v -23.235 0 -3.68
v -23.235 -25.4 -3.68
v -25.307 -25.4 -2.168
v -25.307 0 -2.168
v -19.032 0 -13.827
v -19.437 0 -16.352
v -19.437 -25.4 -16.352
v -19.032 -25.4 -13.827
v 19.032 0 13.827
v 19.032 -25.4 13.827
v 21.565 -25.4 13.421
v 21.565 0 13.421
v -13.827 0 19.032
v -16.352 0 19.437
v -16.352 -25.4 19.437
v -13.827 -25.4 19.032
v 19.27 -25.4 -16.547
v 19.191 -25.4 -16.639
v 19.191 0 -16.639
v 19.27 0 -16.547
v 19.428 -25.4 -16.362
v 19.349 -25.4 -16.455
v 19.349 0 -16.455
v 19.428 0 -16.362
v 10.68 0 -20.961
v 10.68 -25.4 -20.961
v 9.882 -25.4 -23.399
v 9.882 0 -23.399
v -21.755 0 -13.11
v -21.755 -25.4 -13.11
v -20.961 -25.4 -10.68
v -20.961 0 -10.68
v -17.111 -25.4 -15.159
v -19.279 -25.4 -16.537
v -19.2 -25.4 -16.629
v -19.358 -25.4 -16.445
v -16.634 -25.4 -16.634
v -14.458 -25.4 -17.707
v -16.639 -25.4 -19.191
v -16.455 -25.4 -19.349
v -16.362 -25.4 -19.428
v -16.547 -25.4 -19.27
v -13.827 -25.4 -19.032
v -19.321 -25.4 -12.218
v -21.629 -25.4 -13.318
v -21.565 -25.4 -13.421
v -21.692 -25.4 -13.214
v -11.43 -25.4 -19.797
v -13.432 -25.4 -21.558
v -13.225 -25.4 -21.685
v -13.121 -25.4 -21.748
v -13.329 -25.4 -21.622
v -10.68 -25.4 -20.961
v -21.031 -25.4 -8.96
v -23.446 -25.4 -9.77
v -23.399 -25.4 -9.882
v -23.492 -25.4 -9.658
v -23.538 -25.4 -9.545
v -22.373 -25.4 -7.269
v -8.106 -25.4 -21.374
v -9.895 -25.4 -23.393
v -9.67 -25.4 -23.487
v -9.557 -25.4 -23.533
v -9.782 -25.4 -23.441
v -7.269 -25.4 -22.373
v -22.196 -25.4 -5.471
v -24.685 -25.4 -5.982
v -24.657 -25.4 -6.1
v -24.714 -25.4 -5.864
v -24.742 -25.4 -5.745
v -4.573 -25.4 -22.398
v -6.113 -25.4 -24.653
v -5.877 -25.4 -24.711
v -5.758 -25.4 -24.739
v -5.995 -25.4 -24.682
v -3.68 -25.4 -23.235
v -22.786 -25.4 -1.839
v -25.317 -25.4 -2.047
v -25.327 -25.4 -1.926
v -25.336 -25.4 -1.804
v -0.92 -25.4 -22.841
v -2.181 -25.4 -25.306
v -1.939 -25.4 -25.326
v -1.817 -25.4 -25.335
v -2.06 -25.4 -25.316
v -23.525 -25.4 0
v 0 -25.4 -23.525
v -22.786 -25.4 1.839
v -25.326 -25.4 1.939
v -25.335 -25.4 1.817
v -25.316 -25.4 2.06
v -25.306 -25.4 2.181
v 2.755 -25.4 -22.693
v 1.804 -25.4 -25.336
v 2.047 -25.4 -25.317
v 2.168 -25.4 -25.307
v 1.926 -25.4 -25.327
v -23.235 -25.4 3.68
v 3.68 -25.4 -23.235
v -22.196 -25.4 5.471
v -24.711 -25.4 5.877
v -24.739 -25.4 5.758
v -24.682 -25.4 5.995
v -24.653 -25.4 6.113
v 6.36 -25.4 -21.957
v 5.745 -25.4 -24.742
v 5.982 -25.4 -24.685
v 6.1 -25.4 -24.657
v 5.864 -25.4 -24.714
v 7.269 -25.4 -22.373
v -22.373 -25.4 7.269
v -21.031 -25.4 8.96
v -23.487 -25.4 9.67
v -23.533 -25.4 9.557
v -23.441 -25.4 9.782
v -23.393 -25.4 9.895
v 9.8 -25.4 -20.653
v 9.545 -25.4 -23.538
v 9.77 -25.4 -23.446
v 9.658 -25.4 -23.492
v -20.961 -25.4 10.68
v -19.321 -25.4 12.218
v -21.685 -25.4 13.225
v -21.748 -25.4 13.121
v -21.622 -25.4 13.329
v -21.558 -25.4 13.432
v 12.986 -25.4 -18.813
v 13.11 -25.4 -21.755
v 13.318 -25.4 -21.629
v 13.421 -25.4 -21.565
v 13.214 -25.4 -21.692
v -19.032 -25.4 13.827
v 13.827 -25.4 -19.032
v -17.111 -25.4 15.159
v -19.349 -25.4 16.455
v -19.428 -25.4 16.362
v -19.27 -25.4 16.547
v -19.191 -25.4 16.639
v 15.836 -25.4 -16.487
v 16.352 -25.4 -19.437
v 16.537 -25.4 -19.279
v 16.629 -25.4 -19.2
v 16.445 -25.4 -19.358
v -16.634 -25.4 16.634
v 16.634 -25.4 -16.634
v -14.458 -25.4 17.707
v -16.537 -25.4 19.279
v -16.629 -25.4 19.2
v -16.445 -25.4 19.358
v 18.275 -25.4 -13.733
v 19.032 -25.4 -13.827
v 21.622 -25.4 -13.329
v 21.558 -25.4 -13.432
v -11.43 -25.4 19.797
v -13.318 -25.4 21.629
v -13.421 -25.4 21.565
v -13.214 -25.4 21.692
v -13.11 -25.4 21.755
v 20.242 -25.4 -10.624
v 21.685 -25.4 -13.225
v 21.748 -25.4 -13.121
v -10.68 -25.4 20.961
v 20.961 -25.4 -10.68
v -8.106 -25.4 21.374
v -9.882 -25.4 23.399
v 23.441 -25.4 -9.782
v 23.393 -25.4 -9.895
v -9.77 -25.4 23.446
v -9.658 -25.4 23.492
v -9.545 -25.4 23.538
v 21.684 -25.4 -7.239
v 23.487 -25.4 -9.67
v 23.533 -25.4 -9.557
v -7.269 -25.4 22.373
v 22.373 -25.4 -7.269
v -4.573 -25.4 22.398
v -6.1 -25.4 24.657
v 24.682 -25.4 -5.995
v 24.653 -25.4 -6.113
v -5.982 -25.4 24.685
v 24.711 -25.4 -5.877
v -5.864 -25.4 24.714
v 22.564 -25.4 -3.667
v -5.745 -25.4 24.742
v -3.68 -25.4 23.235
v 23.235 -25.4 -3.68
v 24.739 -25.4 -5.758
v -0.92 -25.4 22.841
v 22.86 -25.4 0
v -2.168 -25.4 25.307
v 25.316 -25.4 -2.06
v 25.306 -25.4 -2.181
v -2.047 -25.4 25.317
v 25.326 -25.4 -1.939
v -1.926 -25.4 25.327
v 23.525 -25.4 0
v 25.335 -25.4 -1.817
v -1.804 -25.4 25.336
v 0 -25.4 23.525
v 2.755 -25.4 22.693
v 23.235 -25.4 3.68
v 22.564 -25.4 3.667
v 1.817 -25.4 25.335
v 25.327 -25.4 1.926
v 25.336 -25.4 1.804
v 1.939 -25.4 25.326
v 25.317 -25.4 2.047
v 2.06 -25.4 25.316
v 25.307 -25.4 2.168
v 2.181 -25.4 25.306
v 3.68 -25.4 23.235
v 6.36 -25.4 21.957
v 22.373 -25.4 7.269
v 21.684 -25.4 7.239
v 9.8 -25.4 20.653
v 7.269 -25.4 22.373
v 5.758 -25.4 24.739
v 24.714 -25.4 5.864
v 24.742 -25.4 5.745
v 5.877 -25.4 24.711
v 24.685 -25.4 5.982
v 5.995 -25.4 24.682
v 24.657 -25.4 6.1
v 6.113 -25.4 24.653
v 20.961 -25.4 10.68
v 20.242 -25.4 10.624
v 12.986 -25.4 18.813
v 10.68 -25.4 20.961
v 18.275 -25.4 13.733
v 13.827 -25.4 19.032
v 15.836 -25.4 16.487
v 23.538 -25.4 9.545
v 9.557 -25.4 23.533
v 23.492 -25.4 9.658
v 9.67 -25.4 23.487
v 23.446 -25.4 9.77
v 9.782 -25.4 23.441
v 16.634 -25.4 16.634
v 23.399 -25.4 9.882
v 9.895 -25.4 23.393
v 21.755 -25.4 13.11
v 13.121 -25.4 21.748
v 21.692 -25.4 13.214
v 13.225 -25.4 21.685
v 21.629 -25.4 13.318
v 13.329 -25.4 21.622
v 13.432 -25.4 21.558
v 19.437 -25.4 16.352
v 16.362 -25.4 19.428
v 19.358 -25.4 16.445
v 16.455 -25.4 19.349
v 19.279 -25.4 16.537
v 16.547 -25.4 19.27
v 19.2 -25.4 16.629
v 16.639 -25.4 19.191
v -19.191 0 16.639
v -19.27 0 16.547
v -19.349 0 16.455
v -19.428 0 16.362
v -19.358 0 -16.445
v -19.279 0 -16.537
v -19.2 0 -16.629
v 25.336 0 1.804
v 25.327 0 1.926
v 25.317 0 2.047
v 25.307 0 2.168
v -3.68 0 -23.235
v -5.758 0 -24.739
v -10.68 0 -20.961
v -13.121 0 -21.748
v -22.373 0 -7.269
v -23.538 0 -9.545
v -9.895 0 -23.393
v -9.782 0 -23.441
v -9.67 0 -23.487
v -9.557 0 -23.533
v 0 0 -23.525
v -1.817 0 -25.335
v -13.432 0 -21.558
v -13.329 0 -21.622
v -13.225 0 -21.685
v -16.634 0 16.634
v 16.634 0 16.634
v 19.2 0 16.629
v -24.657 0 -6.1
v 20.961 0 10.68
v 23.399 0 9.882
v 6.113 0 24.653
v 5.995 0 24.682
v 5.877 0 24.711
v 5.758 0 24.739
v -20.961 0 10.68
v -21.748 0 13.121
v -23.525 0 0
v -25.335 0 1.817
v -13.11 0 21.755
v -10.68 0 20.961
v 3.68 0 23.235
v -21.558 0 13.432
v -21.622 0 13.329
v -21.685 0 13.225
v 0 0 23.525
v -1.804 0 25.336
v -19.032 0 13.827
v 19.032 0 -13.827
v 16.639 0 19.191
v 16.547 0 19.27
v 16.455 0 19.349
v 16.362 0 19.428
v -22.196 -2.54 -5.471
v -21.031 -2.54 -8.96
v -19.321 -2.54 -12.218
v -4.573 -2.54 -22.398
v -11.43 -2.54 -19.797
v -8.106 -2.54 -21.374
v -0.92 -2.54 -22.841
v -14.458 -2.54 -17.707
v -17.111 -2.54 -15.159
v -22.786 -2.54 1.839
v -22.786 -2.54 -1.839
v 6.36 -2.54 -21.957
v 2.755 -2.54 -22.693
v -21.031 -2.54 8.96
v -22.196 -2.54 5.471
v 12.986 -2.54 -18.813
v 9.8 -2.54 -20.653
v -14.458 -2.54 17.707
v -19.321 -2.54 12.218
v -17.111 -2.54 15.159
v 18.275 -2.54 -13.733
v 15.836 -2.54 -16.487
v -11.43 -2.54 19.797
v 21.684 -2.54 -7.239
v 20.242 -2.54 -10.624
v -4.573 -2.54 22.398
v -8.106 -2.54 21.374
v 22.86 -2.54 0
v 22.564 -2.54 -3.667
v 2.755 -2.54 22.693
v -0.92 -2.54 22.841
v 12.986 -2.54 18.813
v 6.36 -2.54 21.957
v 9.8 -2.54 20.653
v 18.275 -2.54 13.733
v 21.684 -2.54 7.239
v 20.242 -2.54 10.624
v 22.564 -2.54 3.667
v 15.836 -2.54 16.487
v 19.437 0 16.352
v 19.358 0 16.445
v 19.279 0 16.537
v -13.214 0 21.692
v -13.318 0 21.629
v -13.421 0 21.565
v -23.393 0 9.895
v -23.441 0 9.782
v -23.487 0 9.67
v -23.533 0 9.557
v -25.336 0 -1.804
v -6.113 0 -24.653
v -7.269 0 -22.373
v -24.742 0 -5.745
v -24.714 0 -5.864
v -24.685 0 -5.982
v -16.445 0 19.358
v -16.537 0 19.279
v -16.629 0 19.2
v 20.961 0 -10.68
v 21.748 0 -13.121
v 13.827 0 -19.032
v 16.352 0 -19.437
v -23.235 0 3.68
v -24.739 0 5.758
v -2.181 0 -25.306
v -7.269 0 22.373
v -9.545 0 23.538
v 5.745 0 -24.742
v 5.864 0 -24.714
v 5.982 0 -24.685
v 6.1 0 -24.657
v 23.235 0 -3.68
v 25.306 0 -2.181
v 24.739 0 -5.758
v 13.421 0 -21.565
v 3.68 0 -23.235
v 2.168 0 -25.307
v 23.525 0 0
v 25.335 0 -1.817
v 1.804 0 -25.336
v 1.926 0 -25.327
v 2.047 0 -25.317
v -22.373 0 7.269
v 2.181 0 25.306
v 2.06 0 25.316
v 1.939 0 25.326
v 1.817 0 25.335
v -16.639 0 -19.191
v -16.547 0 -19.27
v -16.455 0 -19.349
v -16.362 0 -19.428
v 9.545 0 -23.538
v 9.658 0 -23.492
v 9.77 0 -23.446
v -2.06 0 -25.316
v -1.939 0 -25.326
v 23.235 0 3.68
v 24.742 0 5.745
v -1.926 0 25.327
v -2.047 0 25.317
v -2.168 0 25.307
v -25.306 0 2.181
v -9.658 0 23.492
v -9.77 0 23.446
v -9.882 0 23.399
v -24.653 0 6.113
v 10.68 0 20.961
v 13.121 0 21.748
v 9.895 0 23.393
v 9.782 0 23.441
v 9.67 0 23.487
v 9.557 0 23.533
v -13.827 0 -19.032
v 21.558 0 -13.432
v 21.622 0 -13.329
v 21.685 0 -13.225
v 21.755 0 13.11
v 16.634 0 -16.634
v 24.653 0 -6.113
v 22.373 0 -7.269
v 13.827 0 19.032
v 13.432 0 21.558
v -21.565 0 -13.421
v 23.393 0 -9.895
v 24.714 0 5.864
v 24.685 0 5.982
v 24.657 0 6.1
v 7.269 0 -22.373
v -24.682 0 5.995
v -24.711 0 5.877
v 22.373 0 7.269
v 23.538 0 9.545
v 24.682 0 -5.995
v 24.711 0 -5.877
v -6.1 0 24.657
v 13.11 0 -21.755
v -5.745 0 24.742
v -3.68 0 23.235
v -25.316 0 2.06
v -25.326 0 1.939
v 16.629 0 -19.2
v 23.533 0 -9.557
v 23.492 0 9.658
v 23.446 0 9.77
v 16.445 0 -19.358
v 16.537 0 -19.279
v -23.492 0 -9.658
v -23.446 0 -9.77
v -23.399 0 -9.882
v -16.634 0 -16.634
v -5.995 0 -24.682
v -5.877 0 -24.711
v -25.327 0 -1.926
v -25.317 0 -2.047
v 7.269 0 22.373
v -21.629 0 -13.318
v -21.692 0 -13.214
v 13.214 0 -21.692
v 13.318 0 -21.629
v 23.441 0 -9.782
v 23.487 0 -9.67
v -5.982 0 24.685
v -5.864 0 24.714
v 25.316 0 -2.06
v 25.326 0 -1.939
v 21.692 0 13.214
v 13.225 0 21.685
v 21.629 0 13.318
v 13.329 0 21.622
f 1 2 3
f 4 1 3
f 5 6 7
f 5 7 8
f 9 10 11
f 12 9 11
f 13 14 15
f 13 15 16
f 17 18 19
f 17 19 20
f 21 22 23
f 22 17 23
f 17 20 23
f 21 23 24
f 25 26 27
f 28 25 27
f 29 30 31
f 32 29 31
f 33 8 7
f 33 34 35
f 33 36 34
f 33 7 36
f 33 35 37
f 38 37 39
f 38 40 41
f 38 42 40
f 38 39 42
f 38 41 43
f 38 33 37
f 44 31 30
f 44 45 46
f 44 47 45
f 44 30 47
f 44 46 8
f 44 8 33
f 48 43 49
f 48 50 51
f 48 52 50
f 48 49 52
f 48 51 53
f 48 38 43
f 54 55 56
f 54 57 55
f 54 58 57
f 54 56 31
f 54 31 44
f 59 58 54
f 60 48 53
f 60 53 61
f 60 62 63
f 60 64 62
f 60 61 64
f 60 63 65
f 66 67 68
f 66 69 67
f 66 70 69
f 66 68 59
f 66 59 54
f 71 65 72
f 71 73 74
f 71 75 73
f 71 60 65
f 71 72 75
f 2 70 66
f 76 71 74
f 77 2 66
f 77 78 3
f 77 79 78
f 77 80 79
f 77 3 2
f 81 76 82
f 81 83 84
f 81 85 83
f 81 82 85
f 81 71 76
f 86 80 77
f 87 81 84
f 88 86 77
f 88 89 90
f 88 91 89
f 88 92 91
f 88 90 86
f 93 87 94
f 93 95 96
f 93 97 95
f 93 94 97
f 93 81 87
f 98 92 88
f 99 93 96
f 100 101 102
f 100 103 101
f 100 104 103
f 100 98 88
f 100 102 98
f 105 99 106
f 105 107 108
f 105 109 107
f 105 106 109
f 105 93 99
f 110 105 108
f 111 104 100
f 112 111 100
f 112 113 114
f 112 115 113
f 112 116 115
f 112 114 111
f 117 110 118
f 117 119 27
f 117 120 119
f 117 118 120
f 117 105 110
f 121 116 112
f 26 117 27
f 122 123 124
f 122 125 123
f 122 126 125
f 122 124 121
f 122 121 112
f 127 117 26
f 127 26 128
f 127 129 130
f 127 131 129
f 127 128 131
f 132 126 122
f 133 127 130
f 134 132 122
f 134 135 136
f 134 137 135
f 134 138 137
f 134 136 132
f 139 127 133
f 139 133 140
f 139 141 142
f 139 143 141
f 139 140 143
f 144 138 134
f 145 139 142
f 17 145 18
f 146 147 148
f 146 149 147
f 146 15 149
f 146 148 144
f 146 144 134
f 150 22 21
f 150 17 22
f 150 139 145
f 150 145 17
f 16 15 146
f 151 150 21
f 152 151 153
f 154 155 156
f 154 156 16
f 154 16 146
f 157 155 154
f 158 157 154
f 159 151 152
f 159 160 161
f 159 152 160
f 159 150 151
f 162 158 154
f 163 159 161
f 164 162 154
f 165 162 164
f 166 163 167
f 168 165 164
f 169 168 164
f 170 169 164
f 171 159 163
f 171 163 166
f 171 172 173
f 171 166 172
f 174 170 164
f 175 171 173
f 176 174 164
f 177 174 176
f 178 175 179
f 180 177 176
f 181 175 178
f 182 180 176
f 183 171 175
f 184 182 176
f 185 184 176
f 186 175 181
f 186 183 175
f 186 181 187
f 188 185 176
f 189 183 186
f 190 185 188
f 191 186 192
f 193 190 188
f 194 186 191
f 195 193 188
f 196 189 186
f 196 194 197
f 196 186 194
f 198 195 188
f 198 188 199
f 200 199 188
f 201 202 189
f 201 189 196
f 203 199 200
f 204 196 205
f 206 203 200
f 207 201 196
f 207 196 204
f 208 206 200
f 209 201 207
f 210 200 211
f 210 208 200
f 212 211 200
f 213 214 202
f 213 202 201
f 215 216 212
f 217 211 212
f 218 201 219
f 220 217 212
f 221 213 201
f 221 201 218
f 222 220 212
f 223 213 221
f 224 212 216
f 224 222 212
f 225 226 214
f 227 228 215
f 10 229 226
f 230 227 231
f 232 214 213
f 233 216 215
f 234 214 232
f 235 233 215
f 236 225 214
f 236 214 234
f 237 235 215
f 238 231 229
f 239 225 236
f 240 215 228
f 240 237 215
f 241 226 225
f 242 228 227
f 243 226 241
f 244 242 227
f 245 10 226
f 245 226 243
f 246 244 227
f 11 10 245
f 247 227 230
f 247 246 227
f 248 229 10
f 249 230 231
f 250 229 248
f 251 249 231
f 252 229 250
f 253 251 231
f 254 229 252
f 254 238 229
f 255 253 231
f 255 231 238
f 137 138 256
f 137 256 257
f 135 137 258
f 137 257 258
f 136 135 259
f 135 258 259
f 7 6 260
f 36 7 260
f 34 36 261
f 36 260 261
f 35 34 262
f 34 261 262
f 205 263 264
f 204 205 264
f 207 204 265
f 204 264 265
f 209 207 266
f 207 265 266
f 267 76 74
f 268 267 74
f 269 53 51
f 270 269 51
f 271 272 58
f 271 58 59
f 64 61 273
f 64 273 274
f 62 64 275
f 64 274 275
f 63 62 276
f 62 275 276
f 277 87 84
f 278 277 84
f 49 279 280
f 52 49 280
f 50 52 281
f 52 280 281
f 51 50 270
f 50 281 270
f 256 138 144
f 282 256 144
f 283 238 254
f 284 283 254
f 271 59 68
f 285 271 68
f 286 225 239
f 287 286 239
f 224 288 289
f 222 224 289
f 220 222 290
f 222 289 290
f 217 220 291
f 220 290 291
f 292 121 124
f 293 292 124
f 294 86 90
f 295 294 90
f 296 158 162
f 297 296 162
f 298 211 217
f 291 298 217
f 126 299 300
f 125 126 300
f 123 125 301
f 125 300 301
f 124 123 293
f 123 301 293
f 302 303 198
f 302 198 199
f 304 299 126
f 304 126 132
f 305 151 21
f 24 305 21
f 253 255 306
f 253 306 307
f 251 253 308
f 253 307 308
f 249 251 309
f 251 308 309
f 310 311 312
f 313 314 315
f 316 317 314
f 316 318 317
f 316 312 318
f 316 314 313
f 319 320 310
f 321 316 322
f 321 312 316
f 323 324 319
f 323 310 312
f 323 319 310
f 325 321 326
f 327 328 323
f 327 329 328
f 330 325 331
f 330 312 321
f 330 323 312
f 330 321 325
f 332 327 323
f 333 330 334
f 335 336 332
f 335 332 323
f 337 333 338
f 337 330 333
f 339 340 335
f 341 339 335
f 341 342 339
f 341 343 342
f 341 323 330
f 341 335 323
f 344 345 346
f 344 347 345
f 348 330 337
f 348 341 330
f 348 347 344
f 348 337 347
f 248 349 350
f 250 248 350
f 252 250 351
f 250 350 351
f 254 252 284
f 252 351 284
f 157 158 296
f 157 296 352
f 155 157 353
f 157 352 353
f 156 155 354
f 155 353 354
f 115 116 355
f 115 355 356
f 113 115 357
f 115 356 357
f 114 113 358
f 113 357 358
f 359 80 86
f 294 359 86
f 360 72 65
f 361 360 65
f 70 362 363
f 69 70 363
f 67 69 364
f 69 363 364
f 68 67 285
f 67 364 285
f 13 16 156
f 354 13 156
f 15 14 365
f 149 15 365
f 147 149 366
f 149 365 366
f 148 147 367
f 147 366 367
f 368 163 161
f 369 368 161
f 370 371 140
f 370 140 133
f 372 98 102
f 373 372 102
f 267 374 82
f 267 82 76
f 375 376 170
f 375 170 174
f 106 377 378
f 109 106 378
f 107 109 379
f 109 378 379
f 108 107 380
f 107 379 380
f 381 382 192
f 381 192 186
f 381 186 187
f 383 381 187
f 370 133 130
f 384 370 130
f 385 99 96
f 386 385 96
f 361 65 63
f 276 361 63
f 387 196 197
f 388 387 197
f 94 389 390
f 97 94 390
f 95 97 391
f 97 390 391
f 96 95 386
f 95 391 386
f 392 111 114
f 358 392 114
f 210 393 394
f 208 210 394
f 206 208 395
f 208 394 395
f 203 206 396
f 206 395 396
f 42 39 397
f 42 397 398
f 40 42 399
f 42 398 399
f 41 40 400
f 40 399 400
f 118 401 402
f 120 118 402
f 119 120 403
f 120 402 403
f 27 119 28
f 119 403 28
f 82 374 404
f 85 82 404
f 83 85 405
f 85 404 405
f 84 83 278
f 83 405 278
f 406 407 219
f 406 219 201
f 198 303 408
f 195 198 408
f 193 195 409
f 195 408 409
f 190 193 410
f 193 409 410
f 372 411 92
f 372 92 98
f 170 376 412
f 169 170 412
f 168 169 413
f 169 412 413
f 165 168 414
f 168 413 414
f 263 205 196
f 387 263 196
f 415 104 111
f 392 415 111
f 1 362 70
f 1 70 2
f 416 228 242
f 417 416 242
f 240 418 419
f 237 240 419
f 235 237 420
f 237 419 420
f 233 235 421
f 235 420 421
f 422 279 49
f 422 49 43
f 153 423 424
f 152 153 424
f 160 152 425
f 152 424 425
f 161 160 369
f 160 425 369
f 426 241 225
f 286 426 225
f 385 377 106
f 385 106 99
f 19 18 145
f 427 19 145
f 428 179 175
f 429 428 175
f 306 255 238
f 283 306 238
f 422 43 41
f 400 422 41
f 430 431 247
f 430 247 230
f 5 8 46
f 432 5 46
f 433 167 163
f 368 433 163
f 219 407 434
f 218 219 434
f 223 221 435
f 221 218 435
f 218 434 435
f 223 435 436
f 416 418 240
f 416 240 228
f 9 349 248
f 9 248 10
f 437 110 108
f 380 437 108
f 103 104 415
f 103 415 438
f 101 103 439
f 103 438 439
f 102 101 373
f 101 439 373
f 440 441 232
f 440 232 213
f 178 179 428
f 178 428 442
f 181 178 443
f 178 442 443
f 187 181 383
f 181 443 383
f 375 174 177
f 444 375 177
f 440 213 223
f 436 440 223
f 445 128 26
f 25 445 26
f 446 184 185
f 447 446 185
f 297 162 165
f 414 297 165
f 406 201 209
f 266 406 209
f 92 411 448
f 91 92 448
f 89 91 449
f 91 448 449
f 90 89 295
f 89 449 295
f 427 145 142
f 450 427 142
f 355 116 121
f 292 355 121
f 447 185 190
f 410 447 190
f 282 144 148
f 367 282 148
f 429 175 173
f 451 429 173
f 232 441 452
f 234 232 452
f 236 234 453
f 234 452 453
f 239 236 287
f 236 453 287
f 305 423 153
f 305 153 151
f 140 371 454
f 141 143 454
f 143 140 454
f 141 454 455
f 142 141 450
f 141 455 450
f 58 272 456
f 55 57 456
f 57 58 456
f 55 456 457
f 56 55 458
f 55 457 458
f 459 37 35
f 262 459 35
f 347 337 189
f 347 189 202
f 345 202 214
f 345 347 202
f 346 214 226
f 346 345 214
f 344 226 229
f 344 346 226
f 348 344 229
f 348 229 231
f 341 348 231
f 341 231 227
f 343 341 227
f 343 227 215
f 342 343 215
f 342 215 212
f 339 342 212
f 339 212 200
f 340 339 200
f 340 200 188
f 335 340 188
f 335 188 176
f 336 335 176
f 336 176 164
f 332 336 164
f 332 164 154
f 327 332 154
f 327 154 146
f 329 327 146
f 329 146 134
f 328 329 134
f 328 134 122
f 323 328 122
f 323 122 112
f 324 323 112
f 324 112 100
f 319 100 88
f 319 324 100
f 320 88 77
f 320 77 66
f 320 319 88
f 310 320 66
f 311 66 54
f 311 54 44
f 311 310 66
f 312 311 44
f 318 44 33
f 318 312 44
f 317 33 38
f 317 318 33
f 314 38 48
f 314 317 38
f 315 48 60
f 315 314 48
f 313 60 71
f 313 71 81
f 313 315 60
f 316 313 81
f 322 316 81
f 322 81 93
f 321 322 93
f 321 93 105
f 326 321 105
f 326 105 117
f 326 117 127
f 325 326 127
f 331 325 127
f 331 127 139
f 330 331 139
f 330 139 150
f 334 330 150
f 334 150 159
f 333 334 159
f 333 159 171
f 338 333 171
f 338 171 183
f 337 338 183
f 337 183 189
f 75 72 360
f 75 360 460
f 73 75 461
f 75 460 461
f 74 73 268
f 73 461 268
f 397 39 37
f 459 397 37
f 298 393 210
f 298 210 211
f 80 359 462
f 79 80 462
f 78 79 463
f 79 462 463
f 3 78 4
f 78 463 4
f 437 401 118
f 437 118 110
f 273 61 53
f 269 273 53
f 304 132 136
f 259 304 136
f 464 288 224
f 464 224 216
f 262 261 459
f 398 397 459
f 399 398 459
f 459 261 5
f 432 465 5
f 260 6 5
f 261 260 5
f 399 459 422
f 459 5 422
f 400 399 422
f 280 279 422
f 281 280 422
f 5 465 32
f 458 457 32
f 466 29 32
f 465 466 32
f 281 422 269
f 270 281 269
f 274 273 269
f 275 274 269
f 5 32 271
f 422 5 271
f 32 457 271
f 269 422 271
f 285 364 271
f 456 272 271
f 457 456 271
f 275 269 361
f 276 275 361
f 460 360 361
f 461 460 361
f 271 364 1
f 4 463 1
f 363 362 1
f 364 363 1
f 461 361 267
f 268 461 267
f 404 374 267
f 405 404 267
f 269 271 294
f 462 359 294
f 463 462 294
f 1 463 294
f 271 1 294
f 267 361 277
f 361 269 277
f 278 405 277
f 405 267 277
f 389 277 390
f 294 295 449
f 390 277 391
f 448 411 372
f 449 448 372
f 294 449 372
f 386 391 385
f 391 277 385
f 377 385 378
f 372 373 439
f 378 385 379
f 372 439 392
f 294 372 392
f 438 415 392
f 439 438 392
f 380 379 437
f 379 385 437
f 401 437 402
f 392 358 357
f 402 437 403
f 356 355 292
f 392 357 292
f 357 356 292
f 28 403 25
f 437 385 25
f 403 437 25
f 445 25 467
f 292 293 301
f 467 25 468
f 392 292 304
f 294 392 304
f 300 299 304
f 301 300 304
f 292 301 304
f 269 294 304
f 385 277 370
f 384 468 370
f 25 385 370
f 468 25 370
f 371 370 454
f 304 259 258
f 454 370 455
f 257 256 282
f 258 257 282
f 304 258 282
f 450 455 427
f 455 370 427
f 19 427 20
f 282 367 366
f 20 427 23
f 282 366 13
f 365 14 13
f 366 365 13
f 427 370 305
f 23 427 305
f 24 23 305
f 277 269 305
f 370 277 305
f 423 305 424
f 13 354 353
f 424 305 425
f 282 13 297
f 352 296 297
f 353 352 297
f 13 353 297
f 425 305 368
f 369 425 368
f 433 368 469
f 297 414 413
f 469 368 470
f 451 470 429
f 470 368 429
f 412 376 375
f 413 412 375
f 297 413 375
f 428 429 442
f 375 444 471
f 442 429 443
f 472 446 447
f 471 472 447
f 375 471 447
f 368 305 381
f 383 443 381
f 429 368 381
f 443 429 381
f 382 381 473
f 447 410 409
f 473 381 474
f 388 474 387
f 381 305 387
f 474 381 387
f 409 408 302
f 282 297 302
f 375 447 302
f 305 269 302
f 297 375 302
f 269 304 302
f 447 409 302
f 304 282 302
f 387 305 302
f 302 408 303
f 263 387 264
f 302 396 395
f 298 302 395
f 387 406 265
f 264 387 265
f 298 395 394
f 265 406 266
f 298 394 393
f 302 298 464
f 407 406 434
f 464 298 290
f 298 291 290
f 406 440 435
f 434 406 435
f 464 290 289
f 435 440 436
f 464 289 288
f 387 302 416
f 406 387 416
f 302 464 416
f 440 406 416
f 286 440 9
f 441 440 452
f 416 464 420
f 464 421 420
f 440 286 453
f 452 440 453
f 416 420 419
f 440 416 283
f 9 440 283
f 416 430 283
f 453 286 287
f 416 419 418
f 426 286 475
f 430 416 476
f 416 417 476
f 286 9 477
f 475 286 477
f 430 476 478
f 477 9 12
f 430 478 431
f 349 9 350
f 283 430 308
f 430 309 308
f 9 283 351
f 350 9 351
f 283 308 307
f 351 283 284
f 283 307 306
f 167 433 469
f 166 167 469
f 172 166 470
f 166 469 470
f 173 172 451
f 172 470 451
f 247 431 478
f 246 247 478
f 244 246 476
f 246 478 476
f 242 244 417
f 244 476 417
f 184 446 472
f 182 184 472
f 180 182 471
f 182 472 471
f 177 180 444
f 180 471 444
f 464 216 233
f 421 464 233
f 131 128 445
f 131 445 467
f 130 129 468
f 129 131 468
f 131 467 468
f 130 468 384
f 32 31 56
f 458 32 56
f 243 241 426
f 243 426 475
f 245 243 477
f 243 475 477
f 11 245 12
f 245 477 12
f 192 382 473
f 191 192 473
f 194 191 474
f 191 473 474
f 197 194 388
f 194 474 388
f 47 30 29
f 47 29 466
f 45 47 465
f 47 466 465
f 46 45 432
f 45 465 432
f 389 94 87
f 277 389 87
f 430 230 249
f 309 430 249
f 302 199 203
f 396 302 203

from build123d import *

# Parameters (mm, degrees)
F0_R            = 25.4
F1_DEPTH        = 25.4
F2_T            = -2.54
F6_DEPTH        = 25.4
F6_COPIES_COUNT = 40


# Not quite as in the source:
# - a pattern or mirror of a feature is missing from the dataset's text; its kind, count and spacing are read off the source's solid
# - a feature names something its author has since deleted; it is built from what else it names


with BuildPart() as f1:
    # F0 (on Front) → F1 (new body)
    with BuildSketch(Plane.XZ):
        Circle(F0_R)
    extrude(amount=F1_DEPTH)

    # F2
    f2_openings = [f1.faces().sort_by_distance(p)[0] for p in [
        (0, -25.4, 0),
    ]]
    offset(amount=F2_T, openings=f2_openings)

    # F4 (on offset) → F6 (cut)
    with BuildSketch(Plane.XZ.offset(25.4)):
        Polygon((1.9352714298, 25.4522323095), (-1.9276905805, 25.4598131588), (0, 23.524541729), align=None)
    f6 = extrude(amount=-F6_DEPTH, mode=Mode.SUBTRACT)

    # F6_copies: F6 ×40 about axis
    f6_copies_axis = Axis((0, 0, 0), (0, 1, 0))
    for i in range(1, F6_COPIES_COUNT):
        add(f6.rotate(f6_copies_axis, i * 360 / F6_COPIES_COUNT), mode=Mode.SUBTRACT)


solid = f1.part
